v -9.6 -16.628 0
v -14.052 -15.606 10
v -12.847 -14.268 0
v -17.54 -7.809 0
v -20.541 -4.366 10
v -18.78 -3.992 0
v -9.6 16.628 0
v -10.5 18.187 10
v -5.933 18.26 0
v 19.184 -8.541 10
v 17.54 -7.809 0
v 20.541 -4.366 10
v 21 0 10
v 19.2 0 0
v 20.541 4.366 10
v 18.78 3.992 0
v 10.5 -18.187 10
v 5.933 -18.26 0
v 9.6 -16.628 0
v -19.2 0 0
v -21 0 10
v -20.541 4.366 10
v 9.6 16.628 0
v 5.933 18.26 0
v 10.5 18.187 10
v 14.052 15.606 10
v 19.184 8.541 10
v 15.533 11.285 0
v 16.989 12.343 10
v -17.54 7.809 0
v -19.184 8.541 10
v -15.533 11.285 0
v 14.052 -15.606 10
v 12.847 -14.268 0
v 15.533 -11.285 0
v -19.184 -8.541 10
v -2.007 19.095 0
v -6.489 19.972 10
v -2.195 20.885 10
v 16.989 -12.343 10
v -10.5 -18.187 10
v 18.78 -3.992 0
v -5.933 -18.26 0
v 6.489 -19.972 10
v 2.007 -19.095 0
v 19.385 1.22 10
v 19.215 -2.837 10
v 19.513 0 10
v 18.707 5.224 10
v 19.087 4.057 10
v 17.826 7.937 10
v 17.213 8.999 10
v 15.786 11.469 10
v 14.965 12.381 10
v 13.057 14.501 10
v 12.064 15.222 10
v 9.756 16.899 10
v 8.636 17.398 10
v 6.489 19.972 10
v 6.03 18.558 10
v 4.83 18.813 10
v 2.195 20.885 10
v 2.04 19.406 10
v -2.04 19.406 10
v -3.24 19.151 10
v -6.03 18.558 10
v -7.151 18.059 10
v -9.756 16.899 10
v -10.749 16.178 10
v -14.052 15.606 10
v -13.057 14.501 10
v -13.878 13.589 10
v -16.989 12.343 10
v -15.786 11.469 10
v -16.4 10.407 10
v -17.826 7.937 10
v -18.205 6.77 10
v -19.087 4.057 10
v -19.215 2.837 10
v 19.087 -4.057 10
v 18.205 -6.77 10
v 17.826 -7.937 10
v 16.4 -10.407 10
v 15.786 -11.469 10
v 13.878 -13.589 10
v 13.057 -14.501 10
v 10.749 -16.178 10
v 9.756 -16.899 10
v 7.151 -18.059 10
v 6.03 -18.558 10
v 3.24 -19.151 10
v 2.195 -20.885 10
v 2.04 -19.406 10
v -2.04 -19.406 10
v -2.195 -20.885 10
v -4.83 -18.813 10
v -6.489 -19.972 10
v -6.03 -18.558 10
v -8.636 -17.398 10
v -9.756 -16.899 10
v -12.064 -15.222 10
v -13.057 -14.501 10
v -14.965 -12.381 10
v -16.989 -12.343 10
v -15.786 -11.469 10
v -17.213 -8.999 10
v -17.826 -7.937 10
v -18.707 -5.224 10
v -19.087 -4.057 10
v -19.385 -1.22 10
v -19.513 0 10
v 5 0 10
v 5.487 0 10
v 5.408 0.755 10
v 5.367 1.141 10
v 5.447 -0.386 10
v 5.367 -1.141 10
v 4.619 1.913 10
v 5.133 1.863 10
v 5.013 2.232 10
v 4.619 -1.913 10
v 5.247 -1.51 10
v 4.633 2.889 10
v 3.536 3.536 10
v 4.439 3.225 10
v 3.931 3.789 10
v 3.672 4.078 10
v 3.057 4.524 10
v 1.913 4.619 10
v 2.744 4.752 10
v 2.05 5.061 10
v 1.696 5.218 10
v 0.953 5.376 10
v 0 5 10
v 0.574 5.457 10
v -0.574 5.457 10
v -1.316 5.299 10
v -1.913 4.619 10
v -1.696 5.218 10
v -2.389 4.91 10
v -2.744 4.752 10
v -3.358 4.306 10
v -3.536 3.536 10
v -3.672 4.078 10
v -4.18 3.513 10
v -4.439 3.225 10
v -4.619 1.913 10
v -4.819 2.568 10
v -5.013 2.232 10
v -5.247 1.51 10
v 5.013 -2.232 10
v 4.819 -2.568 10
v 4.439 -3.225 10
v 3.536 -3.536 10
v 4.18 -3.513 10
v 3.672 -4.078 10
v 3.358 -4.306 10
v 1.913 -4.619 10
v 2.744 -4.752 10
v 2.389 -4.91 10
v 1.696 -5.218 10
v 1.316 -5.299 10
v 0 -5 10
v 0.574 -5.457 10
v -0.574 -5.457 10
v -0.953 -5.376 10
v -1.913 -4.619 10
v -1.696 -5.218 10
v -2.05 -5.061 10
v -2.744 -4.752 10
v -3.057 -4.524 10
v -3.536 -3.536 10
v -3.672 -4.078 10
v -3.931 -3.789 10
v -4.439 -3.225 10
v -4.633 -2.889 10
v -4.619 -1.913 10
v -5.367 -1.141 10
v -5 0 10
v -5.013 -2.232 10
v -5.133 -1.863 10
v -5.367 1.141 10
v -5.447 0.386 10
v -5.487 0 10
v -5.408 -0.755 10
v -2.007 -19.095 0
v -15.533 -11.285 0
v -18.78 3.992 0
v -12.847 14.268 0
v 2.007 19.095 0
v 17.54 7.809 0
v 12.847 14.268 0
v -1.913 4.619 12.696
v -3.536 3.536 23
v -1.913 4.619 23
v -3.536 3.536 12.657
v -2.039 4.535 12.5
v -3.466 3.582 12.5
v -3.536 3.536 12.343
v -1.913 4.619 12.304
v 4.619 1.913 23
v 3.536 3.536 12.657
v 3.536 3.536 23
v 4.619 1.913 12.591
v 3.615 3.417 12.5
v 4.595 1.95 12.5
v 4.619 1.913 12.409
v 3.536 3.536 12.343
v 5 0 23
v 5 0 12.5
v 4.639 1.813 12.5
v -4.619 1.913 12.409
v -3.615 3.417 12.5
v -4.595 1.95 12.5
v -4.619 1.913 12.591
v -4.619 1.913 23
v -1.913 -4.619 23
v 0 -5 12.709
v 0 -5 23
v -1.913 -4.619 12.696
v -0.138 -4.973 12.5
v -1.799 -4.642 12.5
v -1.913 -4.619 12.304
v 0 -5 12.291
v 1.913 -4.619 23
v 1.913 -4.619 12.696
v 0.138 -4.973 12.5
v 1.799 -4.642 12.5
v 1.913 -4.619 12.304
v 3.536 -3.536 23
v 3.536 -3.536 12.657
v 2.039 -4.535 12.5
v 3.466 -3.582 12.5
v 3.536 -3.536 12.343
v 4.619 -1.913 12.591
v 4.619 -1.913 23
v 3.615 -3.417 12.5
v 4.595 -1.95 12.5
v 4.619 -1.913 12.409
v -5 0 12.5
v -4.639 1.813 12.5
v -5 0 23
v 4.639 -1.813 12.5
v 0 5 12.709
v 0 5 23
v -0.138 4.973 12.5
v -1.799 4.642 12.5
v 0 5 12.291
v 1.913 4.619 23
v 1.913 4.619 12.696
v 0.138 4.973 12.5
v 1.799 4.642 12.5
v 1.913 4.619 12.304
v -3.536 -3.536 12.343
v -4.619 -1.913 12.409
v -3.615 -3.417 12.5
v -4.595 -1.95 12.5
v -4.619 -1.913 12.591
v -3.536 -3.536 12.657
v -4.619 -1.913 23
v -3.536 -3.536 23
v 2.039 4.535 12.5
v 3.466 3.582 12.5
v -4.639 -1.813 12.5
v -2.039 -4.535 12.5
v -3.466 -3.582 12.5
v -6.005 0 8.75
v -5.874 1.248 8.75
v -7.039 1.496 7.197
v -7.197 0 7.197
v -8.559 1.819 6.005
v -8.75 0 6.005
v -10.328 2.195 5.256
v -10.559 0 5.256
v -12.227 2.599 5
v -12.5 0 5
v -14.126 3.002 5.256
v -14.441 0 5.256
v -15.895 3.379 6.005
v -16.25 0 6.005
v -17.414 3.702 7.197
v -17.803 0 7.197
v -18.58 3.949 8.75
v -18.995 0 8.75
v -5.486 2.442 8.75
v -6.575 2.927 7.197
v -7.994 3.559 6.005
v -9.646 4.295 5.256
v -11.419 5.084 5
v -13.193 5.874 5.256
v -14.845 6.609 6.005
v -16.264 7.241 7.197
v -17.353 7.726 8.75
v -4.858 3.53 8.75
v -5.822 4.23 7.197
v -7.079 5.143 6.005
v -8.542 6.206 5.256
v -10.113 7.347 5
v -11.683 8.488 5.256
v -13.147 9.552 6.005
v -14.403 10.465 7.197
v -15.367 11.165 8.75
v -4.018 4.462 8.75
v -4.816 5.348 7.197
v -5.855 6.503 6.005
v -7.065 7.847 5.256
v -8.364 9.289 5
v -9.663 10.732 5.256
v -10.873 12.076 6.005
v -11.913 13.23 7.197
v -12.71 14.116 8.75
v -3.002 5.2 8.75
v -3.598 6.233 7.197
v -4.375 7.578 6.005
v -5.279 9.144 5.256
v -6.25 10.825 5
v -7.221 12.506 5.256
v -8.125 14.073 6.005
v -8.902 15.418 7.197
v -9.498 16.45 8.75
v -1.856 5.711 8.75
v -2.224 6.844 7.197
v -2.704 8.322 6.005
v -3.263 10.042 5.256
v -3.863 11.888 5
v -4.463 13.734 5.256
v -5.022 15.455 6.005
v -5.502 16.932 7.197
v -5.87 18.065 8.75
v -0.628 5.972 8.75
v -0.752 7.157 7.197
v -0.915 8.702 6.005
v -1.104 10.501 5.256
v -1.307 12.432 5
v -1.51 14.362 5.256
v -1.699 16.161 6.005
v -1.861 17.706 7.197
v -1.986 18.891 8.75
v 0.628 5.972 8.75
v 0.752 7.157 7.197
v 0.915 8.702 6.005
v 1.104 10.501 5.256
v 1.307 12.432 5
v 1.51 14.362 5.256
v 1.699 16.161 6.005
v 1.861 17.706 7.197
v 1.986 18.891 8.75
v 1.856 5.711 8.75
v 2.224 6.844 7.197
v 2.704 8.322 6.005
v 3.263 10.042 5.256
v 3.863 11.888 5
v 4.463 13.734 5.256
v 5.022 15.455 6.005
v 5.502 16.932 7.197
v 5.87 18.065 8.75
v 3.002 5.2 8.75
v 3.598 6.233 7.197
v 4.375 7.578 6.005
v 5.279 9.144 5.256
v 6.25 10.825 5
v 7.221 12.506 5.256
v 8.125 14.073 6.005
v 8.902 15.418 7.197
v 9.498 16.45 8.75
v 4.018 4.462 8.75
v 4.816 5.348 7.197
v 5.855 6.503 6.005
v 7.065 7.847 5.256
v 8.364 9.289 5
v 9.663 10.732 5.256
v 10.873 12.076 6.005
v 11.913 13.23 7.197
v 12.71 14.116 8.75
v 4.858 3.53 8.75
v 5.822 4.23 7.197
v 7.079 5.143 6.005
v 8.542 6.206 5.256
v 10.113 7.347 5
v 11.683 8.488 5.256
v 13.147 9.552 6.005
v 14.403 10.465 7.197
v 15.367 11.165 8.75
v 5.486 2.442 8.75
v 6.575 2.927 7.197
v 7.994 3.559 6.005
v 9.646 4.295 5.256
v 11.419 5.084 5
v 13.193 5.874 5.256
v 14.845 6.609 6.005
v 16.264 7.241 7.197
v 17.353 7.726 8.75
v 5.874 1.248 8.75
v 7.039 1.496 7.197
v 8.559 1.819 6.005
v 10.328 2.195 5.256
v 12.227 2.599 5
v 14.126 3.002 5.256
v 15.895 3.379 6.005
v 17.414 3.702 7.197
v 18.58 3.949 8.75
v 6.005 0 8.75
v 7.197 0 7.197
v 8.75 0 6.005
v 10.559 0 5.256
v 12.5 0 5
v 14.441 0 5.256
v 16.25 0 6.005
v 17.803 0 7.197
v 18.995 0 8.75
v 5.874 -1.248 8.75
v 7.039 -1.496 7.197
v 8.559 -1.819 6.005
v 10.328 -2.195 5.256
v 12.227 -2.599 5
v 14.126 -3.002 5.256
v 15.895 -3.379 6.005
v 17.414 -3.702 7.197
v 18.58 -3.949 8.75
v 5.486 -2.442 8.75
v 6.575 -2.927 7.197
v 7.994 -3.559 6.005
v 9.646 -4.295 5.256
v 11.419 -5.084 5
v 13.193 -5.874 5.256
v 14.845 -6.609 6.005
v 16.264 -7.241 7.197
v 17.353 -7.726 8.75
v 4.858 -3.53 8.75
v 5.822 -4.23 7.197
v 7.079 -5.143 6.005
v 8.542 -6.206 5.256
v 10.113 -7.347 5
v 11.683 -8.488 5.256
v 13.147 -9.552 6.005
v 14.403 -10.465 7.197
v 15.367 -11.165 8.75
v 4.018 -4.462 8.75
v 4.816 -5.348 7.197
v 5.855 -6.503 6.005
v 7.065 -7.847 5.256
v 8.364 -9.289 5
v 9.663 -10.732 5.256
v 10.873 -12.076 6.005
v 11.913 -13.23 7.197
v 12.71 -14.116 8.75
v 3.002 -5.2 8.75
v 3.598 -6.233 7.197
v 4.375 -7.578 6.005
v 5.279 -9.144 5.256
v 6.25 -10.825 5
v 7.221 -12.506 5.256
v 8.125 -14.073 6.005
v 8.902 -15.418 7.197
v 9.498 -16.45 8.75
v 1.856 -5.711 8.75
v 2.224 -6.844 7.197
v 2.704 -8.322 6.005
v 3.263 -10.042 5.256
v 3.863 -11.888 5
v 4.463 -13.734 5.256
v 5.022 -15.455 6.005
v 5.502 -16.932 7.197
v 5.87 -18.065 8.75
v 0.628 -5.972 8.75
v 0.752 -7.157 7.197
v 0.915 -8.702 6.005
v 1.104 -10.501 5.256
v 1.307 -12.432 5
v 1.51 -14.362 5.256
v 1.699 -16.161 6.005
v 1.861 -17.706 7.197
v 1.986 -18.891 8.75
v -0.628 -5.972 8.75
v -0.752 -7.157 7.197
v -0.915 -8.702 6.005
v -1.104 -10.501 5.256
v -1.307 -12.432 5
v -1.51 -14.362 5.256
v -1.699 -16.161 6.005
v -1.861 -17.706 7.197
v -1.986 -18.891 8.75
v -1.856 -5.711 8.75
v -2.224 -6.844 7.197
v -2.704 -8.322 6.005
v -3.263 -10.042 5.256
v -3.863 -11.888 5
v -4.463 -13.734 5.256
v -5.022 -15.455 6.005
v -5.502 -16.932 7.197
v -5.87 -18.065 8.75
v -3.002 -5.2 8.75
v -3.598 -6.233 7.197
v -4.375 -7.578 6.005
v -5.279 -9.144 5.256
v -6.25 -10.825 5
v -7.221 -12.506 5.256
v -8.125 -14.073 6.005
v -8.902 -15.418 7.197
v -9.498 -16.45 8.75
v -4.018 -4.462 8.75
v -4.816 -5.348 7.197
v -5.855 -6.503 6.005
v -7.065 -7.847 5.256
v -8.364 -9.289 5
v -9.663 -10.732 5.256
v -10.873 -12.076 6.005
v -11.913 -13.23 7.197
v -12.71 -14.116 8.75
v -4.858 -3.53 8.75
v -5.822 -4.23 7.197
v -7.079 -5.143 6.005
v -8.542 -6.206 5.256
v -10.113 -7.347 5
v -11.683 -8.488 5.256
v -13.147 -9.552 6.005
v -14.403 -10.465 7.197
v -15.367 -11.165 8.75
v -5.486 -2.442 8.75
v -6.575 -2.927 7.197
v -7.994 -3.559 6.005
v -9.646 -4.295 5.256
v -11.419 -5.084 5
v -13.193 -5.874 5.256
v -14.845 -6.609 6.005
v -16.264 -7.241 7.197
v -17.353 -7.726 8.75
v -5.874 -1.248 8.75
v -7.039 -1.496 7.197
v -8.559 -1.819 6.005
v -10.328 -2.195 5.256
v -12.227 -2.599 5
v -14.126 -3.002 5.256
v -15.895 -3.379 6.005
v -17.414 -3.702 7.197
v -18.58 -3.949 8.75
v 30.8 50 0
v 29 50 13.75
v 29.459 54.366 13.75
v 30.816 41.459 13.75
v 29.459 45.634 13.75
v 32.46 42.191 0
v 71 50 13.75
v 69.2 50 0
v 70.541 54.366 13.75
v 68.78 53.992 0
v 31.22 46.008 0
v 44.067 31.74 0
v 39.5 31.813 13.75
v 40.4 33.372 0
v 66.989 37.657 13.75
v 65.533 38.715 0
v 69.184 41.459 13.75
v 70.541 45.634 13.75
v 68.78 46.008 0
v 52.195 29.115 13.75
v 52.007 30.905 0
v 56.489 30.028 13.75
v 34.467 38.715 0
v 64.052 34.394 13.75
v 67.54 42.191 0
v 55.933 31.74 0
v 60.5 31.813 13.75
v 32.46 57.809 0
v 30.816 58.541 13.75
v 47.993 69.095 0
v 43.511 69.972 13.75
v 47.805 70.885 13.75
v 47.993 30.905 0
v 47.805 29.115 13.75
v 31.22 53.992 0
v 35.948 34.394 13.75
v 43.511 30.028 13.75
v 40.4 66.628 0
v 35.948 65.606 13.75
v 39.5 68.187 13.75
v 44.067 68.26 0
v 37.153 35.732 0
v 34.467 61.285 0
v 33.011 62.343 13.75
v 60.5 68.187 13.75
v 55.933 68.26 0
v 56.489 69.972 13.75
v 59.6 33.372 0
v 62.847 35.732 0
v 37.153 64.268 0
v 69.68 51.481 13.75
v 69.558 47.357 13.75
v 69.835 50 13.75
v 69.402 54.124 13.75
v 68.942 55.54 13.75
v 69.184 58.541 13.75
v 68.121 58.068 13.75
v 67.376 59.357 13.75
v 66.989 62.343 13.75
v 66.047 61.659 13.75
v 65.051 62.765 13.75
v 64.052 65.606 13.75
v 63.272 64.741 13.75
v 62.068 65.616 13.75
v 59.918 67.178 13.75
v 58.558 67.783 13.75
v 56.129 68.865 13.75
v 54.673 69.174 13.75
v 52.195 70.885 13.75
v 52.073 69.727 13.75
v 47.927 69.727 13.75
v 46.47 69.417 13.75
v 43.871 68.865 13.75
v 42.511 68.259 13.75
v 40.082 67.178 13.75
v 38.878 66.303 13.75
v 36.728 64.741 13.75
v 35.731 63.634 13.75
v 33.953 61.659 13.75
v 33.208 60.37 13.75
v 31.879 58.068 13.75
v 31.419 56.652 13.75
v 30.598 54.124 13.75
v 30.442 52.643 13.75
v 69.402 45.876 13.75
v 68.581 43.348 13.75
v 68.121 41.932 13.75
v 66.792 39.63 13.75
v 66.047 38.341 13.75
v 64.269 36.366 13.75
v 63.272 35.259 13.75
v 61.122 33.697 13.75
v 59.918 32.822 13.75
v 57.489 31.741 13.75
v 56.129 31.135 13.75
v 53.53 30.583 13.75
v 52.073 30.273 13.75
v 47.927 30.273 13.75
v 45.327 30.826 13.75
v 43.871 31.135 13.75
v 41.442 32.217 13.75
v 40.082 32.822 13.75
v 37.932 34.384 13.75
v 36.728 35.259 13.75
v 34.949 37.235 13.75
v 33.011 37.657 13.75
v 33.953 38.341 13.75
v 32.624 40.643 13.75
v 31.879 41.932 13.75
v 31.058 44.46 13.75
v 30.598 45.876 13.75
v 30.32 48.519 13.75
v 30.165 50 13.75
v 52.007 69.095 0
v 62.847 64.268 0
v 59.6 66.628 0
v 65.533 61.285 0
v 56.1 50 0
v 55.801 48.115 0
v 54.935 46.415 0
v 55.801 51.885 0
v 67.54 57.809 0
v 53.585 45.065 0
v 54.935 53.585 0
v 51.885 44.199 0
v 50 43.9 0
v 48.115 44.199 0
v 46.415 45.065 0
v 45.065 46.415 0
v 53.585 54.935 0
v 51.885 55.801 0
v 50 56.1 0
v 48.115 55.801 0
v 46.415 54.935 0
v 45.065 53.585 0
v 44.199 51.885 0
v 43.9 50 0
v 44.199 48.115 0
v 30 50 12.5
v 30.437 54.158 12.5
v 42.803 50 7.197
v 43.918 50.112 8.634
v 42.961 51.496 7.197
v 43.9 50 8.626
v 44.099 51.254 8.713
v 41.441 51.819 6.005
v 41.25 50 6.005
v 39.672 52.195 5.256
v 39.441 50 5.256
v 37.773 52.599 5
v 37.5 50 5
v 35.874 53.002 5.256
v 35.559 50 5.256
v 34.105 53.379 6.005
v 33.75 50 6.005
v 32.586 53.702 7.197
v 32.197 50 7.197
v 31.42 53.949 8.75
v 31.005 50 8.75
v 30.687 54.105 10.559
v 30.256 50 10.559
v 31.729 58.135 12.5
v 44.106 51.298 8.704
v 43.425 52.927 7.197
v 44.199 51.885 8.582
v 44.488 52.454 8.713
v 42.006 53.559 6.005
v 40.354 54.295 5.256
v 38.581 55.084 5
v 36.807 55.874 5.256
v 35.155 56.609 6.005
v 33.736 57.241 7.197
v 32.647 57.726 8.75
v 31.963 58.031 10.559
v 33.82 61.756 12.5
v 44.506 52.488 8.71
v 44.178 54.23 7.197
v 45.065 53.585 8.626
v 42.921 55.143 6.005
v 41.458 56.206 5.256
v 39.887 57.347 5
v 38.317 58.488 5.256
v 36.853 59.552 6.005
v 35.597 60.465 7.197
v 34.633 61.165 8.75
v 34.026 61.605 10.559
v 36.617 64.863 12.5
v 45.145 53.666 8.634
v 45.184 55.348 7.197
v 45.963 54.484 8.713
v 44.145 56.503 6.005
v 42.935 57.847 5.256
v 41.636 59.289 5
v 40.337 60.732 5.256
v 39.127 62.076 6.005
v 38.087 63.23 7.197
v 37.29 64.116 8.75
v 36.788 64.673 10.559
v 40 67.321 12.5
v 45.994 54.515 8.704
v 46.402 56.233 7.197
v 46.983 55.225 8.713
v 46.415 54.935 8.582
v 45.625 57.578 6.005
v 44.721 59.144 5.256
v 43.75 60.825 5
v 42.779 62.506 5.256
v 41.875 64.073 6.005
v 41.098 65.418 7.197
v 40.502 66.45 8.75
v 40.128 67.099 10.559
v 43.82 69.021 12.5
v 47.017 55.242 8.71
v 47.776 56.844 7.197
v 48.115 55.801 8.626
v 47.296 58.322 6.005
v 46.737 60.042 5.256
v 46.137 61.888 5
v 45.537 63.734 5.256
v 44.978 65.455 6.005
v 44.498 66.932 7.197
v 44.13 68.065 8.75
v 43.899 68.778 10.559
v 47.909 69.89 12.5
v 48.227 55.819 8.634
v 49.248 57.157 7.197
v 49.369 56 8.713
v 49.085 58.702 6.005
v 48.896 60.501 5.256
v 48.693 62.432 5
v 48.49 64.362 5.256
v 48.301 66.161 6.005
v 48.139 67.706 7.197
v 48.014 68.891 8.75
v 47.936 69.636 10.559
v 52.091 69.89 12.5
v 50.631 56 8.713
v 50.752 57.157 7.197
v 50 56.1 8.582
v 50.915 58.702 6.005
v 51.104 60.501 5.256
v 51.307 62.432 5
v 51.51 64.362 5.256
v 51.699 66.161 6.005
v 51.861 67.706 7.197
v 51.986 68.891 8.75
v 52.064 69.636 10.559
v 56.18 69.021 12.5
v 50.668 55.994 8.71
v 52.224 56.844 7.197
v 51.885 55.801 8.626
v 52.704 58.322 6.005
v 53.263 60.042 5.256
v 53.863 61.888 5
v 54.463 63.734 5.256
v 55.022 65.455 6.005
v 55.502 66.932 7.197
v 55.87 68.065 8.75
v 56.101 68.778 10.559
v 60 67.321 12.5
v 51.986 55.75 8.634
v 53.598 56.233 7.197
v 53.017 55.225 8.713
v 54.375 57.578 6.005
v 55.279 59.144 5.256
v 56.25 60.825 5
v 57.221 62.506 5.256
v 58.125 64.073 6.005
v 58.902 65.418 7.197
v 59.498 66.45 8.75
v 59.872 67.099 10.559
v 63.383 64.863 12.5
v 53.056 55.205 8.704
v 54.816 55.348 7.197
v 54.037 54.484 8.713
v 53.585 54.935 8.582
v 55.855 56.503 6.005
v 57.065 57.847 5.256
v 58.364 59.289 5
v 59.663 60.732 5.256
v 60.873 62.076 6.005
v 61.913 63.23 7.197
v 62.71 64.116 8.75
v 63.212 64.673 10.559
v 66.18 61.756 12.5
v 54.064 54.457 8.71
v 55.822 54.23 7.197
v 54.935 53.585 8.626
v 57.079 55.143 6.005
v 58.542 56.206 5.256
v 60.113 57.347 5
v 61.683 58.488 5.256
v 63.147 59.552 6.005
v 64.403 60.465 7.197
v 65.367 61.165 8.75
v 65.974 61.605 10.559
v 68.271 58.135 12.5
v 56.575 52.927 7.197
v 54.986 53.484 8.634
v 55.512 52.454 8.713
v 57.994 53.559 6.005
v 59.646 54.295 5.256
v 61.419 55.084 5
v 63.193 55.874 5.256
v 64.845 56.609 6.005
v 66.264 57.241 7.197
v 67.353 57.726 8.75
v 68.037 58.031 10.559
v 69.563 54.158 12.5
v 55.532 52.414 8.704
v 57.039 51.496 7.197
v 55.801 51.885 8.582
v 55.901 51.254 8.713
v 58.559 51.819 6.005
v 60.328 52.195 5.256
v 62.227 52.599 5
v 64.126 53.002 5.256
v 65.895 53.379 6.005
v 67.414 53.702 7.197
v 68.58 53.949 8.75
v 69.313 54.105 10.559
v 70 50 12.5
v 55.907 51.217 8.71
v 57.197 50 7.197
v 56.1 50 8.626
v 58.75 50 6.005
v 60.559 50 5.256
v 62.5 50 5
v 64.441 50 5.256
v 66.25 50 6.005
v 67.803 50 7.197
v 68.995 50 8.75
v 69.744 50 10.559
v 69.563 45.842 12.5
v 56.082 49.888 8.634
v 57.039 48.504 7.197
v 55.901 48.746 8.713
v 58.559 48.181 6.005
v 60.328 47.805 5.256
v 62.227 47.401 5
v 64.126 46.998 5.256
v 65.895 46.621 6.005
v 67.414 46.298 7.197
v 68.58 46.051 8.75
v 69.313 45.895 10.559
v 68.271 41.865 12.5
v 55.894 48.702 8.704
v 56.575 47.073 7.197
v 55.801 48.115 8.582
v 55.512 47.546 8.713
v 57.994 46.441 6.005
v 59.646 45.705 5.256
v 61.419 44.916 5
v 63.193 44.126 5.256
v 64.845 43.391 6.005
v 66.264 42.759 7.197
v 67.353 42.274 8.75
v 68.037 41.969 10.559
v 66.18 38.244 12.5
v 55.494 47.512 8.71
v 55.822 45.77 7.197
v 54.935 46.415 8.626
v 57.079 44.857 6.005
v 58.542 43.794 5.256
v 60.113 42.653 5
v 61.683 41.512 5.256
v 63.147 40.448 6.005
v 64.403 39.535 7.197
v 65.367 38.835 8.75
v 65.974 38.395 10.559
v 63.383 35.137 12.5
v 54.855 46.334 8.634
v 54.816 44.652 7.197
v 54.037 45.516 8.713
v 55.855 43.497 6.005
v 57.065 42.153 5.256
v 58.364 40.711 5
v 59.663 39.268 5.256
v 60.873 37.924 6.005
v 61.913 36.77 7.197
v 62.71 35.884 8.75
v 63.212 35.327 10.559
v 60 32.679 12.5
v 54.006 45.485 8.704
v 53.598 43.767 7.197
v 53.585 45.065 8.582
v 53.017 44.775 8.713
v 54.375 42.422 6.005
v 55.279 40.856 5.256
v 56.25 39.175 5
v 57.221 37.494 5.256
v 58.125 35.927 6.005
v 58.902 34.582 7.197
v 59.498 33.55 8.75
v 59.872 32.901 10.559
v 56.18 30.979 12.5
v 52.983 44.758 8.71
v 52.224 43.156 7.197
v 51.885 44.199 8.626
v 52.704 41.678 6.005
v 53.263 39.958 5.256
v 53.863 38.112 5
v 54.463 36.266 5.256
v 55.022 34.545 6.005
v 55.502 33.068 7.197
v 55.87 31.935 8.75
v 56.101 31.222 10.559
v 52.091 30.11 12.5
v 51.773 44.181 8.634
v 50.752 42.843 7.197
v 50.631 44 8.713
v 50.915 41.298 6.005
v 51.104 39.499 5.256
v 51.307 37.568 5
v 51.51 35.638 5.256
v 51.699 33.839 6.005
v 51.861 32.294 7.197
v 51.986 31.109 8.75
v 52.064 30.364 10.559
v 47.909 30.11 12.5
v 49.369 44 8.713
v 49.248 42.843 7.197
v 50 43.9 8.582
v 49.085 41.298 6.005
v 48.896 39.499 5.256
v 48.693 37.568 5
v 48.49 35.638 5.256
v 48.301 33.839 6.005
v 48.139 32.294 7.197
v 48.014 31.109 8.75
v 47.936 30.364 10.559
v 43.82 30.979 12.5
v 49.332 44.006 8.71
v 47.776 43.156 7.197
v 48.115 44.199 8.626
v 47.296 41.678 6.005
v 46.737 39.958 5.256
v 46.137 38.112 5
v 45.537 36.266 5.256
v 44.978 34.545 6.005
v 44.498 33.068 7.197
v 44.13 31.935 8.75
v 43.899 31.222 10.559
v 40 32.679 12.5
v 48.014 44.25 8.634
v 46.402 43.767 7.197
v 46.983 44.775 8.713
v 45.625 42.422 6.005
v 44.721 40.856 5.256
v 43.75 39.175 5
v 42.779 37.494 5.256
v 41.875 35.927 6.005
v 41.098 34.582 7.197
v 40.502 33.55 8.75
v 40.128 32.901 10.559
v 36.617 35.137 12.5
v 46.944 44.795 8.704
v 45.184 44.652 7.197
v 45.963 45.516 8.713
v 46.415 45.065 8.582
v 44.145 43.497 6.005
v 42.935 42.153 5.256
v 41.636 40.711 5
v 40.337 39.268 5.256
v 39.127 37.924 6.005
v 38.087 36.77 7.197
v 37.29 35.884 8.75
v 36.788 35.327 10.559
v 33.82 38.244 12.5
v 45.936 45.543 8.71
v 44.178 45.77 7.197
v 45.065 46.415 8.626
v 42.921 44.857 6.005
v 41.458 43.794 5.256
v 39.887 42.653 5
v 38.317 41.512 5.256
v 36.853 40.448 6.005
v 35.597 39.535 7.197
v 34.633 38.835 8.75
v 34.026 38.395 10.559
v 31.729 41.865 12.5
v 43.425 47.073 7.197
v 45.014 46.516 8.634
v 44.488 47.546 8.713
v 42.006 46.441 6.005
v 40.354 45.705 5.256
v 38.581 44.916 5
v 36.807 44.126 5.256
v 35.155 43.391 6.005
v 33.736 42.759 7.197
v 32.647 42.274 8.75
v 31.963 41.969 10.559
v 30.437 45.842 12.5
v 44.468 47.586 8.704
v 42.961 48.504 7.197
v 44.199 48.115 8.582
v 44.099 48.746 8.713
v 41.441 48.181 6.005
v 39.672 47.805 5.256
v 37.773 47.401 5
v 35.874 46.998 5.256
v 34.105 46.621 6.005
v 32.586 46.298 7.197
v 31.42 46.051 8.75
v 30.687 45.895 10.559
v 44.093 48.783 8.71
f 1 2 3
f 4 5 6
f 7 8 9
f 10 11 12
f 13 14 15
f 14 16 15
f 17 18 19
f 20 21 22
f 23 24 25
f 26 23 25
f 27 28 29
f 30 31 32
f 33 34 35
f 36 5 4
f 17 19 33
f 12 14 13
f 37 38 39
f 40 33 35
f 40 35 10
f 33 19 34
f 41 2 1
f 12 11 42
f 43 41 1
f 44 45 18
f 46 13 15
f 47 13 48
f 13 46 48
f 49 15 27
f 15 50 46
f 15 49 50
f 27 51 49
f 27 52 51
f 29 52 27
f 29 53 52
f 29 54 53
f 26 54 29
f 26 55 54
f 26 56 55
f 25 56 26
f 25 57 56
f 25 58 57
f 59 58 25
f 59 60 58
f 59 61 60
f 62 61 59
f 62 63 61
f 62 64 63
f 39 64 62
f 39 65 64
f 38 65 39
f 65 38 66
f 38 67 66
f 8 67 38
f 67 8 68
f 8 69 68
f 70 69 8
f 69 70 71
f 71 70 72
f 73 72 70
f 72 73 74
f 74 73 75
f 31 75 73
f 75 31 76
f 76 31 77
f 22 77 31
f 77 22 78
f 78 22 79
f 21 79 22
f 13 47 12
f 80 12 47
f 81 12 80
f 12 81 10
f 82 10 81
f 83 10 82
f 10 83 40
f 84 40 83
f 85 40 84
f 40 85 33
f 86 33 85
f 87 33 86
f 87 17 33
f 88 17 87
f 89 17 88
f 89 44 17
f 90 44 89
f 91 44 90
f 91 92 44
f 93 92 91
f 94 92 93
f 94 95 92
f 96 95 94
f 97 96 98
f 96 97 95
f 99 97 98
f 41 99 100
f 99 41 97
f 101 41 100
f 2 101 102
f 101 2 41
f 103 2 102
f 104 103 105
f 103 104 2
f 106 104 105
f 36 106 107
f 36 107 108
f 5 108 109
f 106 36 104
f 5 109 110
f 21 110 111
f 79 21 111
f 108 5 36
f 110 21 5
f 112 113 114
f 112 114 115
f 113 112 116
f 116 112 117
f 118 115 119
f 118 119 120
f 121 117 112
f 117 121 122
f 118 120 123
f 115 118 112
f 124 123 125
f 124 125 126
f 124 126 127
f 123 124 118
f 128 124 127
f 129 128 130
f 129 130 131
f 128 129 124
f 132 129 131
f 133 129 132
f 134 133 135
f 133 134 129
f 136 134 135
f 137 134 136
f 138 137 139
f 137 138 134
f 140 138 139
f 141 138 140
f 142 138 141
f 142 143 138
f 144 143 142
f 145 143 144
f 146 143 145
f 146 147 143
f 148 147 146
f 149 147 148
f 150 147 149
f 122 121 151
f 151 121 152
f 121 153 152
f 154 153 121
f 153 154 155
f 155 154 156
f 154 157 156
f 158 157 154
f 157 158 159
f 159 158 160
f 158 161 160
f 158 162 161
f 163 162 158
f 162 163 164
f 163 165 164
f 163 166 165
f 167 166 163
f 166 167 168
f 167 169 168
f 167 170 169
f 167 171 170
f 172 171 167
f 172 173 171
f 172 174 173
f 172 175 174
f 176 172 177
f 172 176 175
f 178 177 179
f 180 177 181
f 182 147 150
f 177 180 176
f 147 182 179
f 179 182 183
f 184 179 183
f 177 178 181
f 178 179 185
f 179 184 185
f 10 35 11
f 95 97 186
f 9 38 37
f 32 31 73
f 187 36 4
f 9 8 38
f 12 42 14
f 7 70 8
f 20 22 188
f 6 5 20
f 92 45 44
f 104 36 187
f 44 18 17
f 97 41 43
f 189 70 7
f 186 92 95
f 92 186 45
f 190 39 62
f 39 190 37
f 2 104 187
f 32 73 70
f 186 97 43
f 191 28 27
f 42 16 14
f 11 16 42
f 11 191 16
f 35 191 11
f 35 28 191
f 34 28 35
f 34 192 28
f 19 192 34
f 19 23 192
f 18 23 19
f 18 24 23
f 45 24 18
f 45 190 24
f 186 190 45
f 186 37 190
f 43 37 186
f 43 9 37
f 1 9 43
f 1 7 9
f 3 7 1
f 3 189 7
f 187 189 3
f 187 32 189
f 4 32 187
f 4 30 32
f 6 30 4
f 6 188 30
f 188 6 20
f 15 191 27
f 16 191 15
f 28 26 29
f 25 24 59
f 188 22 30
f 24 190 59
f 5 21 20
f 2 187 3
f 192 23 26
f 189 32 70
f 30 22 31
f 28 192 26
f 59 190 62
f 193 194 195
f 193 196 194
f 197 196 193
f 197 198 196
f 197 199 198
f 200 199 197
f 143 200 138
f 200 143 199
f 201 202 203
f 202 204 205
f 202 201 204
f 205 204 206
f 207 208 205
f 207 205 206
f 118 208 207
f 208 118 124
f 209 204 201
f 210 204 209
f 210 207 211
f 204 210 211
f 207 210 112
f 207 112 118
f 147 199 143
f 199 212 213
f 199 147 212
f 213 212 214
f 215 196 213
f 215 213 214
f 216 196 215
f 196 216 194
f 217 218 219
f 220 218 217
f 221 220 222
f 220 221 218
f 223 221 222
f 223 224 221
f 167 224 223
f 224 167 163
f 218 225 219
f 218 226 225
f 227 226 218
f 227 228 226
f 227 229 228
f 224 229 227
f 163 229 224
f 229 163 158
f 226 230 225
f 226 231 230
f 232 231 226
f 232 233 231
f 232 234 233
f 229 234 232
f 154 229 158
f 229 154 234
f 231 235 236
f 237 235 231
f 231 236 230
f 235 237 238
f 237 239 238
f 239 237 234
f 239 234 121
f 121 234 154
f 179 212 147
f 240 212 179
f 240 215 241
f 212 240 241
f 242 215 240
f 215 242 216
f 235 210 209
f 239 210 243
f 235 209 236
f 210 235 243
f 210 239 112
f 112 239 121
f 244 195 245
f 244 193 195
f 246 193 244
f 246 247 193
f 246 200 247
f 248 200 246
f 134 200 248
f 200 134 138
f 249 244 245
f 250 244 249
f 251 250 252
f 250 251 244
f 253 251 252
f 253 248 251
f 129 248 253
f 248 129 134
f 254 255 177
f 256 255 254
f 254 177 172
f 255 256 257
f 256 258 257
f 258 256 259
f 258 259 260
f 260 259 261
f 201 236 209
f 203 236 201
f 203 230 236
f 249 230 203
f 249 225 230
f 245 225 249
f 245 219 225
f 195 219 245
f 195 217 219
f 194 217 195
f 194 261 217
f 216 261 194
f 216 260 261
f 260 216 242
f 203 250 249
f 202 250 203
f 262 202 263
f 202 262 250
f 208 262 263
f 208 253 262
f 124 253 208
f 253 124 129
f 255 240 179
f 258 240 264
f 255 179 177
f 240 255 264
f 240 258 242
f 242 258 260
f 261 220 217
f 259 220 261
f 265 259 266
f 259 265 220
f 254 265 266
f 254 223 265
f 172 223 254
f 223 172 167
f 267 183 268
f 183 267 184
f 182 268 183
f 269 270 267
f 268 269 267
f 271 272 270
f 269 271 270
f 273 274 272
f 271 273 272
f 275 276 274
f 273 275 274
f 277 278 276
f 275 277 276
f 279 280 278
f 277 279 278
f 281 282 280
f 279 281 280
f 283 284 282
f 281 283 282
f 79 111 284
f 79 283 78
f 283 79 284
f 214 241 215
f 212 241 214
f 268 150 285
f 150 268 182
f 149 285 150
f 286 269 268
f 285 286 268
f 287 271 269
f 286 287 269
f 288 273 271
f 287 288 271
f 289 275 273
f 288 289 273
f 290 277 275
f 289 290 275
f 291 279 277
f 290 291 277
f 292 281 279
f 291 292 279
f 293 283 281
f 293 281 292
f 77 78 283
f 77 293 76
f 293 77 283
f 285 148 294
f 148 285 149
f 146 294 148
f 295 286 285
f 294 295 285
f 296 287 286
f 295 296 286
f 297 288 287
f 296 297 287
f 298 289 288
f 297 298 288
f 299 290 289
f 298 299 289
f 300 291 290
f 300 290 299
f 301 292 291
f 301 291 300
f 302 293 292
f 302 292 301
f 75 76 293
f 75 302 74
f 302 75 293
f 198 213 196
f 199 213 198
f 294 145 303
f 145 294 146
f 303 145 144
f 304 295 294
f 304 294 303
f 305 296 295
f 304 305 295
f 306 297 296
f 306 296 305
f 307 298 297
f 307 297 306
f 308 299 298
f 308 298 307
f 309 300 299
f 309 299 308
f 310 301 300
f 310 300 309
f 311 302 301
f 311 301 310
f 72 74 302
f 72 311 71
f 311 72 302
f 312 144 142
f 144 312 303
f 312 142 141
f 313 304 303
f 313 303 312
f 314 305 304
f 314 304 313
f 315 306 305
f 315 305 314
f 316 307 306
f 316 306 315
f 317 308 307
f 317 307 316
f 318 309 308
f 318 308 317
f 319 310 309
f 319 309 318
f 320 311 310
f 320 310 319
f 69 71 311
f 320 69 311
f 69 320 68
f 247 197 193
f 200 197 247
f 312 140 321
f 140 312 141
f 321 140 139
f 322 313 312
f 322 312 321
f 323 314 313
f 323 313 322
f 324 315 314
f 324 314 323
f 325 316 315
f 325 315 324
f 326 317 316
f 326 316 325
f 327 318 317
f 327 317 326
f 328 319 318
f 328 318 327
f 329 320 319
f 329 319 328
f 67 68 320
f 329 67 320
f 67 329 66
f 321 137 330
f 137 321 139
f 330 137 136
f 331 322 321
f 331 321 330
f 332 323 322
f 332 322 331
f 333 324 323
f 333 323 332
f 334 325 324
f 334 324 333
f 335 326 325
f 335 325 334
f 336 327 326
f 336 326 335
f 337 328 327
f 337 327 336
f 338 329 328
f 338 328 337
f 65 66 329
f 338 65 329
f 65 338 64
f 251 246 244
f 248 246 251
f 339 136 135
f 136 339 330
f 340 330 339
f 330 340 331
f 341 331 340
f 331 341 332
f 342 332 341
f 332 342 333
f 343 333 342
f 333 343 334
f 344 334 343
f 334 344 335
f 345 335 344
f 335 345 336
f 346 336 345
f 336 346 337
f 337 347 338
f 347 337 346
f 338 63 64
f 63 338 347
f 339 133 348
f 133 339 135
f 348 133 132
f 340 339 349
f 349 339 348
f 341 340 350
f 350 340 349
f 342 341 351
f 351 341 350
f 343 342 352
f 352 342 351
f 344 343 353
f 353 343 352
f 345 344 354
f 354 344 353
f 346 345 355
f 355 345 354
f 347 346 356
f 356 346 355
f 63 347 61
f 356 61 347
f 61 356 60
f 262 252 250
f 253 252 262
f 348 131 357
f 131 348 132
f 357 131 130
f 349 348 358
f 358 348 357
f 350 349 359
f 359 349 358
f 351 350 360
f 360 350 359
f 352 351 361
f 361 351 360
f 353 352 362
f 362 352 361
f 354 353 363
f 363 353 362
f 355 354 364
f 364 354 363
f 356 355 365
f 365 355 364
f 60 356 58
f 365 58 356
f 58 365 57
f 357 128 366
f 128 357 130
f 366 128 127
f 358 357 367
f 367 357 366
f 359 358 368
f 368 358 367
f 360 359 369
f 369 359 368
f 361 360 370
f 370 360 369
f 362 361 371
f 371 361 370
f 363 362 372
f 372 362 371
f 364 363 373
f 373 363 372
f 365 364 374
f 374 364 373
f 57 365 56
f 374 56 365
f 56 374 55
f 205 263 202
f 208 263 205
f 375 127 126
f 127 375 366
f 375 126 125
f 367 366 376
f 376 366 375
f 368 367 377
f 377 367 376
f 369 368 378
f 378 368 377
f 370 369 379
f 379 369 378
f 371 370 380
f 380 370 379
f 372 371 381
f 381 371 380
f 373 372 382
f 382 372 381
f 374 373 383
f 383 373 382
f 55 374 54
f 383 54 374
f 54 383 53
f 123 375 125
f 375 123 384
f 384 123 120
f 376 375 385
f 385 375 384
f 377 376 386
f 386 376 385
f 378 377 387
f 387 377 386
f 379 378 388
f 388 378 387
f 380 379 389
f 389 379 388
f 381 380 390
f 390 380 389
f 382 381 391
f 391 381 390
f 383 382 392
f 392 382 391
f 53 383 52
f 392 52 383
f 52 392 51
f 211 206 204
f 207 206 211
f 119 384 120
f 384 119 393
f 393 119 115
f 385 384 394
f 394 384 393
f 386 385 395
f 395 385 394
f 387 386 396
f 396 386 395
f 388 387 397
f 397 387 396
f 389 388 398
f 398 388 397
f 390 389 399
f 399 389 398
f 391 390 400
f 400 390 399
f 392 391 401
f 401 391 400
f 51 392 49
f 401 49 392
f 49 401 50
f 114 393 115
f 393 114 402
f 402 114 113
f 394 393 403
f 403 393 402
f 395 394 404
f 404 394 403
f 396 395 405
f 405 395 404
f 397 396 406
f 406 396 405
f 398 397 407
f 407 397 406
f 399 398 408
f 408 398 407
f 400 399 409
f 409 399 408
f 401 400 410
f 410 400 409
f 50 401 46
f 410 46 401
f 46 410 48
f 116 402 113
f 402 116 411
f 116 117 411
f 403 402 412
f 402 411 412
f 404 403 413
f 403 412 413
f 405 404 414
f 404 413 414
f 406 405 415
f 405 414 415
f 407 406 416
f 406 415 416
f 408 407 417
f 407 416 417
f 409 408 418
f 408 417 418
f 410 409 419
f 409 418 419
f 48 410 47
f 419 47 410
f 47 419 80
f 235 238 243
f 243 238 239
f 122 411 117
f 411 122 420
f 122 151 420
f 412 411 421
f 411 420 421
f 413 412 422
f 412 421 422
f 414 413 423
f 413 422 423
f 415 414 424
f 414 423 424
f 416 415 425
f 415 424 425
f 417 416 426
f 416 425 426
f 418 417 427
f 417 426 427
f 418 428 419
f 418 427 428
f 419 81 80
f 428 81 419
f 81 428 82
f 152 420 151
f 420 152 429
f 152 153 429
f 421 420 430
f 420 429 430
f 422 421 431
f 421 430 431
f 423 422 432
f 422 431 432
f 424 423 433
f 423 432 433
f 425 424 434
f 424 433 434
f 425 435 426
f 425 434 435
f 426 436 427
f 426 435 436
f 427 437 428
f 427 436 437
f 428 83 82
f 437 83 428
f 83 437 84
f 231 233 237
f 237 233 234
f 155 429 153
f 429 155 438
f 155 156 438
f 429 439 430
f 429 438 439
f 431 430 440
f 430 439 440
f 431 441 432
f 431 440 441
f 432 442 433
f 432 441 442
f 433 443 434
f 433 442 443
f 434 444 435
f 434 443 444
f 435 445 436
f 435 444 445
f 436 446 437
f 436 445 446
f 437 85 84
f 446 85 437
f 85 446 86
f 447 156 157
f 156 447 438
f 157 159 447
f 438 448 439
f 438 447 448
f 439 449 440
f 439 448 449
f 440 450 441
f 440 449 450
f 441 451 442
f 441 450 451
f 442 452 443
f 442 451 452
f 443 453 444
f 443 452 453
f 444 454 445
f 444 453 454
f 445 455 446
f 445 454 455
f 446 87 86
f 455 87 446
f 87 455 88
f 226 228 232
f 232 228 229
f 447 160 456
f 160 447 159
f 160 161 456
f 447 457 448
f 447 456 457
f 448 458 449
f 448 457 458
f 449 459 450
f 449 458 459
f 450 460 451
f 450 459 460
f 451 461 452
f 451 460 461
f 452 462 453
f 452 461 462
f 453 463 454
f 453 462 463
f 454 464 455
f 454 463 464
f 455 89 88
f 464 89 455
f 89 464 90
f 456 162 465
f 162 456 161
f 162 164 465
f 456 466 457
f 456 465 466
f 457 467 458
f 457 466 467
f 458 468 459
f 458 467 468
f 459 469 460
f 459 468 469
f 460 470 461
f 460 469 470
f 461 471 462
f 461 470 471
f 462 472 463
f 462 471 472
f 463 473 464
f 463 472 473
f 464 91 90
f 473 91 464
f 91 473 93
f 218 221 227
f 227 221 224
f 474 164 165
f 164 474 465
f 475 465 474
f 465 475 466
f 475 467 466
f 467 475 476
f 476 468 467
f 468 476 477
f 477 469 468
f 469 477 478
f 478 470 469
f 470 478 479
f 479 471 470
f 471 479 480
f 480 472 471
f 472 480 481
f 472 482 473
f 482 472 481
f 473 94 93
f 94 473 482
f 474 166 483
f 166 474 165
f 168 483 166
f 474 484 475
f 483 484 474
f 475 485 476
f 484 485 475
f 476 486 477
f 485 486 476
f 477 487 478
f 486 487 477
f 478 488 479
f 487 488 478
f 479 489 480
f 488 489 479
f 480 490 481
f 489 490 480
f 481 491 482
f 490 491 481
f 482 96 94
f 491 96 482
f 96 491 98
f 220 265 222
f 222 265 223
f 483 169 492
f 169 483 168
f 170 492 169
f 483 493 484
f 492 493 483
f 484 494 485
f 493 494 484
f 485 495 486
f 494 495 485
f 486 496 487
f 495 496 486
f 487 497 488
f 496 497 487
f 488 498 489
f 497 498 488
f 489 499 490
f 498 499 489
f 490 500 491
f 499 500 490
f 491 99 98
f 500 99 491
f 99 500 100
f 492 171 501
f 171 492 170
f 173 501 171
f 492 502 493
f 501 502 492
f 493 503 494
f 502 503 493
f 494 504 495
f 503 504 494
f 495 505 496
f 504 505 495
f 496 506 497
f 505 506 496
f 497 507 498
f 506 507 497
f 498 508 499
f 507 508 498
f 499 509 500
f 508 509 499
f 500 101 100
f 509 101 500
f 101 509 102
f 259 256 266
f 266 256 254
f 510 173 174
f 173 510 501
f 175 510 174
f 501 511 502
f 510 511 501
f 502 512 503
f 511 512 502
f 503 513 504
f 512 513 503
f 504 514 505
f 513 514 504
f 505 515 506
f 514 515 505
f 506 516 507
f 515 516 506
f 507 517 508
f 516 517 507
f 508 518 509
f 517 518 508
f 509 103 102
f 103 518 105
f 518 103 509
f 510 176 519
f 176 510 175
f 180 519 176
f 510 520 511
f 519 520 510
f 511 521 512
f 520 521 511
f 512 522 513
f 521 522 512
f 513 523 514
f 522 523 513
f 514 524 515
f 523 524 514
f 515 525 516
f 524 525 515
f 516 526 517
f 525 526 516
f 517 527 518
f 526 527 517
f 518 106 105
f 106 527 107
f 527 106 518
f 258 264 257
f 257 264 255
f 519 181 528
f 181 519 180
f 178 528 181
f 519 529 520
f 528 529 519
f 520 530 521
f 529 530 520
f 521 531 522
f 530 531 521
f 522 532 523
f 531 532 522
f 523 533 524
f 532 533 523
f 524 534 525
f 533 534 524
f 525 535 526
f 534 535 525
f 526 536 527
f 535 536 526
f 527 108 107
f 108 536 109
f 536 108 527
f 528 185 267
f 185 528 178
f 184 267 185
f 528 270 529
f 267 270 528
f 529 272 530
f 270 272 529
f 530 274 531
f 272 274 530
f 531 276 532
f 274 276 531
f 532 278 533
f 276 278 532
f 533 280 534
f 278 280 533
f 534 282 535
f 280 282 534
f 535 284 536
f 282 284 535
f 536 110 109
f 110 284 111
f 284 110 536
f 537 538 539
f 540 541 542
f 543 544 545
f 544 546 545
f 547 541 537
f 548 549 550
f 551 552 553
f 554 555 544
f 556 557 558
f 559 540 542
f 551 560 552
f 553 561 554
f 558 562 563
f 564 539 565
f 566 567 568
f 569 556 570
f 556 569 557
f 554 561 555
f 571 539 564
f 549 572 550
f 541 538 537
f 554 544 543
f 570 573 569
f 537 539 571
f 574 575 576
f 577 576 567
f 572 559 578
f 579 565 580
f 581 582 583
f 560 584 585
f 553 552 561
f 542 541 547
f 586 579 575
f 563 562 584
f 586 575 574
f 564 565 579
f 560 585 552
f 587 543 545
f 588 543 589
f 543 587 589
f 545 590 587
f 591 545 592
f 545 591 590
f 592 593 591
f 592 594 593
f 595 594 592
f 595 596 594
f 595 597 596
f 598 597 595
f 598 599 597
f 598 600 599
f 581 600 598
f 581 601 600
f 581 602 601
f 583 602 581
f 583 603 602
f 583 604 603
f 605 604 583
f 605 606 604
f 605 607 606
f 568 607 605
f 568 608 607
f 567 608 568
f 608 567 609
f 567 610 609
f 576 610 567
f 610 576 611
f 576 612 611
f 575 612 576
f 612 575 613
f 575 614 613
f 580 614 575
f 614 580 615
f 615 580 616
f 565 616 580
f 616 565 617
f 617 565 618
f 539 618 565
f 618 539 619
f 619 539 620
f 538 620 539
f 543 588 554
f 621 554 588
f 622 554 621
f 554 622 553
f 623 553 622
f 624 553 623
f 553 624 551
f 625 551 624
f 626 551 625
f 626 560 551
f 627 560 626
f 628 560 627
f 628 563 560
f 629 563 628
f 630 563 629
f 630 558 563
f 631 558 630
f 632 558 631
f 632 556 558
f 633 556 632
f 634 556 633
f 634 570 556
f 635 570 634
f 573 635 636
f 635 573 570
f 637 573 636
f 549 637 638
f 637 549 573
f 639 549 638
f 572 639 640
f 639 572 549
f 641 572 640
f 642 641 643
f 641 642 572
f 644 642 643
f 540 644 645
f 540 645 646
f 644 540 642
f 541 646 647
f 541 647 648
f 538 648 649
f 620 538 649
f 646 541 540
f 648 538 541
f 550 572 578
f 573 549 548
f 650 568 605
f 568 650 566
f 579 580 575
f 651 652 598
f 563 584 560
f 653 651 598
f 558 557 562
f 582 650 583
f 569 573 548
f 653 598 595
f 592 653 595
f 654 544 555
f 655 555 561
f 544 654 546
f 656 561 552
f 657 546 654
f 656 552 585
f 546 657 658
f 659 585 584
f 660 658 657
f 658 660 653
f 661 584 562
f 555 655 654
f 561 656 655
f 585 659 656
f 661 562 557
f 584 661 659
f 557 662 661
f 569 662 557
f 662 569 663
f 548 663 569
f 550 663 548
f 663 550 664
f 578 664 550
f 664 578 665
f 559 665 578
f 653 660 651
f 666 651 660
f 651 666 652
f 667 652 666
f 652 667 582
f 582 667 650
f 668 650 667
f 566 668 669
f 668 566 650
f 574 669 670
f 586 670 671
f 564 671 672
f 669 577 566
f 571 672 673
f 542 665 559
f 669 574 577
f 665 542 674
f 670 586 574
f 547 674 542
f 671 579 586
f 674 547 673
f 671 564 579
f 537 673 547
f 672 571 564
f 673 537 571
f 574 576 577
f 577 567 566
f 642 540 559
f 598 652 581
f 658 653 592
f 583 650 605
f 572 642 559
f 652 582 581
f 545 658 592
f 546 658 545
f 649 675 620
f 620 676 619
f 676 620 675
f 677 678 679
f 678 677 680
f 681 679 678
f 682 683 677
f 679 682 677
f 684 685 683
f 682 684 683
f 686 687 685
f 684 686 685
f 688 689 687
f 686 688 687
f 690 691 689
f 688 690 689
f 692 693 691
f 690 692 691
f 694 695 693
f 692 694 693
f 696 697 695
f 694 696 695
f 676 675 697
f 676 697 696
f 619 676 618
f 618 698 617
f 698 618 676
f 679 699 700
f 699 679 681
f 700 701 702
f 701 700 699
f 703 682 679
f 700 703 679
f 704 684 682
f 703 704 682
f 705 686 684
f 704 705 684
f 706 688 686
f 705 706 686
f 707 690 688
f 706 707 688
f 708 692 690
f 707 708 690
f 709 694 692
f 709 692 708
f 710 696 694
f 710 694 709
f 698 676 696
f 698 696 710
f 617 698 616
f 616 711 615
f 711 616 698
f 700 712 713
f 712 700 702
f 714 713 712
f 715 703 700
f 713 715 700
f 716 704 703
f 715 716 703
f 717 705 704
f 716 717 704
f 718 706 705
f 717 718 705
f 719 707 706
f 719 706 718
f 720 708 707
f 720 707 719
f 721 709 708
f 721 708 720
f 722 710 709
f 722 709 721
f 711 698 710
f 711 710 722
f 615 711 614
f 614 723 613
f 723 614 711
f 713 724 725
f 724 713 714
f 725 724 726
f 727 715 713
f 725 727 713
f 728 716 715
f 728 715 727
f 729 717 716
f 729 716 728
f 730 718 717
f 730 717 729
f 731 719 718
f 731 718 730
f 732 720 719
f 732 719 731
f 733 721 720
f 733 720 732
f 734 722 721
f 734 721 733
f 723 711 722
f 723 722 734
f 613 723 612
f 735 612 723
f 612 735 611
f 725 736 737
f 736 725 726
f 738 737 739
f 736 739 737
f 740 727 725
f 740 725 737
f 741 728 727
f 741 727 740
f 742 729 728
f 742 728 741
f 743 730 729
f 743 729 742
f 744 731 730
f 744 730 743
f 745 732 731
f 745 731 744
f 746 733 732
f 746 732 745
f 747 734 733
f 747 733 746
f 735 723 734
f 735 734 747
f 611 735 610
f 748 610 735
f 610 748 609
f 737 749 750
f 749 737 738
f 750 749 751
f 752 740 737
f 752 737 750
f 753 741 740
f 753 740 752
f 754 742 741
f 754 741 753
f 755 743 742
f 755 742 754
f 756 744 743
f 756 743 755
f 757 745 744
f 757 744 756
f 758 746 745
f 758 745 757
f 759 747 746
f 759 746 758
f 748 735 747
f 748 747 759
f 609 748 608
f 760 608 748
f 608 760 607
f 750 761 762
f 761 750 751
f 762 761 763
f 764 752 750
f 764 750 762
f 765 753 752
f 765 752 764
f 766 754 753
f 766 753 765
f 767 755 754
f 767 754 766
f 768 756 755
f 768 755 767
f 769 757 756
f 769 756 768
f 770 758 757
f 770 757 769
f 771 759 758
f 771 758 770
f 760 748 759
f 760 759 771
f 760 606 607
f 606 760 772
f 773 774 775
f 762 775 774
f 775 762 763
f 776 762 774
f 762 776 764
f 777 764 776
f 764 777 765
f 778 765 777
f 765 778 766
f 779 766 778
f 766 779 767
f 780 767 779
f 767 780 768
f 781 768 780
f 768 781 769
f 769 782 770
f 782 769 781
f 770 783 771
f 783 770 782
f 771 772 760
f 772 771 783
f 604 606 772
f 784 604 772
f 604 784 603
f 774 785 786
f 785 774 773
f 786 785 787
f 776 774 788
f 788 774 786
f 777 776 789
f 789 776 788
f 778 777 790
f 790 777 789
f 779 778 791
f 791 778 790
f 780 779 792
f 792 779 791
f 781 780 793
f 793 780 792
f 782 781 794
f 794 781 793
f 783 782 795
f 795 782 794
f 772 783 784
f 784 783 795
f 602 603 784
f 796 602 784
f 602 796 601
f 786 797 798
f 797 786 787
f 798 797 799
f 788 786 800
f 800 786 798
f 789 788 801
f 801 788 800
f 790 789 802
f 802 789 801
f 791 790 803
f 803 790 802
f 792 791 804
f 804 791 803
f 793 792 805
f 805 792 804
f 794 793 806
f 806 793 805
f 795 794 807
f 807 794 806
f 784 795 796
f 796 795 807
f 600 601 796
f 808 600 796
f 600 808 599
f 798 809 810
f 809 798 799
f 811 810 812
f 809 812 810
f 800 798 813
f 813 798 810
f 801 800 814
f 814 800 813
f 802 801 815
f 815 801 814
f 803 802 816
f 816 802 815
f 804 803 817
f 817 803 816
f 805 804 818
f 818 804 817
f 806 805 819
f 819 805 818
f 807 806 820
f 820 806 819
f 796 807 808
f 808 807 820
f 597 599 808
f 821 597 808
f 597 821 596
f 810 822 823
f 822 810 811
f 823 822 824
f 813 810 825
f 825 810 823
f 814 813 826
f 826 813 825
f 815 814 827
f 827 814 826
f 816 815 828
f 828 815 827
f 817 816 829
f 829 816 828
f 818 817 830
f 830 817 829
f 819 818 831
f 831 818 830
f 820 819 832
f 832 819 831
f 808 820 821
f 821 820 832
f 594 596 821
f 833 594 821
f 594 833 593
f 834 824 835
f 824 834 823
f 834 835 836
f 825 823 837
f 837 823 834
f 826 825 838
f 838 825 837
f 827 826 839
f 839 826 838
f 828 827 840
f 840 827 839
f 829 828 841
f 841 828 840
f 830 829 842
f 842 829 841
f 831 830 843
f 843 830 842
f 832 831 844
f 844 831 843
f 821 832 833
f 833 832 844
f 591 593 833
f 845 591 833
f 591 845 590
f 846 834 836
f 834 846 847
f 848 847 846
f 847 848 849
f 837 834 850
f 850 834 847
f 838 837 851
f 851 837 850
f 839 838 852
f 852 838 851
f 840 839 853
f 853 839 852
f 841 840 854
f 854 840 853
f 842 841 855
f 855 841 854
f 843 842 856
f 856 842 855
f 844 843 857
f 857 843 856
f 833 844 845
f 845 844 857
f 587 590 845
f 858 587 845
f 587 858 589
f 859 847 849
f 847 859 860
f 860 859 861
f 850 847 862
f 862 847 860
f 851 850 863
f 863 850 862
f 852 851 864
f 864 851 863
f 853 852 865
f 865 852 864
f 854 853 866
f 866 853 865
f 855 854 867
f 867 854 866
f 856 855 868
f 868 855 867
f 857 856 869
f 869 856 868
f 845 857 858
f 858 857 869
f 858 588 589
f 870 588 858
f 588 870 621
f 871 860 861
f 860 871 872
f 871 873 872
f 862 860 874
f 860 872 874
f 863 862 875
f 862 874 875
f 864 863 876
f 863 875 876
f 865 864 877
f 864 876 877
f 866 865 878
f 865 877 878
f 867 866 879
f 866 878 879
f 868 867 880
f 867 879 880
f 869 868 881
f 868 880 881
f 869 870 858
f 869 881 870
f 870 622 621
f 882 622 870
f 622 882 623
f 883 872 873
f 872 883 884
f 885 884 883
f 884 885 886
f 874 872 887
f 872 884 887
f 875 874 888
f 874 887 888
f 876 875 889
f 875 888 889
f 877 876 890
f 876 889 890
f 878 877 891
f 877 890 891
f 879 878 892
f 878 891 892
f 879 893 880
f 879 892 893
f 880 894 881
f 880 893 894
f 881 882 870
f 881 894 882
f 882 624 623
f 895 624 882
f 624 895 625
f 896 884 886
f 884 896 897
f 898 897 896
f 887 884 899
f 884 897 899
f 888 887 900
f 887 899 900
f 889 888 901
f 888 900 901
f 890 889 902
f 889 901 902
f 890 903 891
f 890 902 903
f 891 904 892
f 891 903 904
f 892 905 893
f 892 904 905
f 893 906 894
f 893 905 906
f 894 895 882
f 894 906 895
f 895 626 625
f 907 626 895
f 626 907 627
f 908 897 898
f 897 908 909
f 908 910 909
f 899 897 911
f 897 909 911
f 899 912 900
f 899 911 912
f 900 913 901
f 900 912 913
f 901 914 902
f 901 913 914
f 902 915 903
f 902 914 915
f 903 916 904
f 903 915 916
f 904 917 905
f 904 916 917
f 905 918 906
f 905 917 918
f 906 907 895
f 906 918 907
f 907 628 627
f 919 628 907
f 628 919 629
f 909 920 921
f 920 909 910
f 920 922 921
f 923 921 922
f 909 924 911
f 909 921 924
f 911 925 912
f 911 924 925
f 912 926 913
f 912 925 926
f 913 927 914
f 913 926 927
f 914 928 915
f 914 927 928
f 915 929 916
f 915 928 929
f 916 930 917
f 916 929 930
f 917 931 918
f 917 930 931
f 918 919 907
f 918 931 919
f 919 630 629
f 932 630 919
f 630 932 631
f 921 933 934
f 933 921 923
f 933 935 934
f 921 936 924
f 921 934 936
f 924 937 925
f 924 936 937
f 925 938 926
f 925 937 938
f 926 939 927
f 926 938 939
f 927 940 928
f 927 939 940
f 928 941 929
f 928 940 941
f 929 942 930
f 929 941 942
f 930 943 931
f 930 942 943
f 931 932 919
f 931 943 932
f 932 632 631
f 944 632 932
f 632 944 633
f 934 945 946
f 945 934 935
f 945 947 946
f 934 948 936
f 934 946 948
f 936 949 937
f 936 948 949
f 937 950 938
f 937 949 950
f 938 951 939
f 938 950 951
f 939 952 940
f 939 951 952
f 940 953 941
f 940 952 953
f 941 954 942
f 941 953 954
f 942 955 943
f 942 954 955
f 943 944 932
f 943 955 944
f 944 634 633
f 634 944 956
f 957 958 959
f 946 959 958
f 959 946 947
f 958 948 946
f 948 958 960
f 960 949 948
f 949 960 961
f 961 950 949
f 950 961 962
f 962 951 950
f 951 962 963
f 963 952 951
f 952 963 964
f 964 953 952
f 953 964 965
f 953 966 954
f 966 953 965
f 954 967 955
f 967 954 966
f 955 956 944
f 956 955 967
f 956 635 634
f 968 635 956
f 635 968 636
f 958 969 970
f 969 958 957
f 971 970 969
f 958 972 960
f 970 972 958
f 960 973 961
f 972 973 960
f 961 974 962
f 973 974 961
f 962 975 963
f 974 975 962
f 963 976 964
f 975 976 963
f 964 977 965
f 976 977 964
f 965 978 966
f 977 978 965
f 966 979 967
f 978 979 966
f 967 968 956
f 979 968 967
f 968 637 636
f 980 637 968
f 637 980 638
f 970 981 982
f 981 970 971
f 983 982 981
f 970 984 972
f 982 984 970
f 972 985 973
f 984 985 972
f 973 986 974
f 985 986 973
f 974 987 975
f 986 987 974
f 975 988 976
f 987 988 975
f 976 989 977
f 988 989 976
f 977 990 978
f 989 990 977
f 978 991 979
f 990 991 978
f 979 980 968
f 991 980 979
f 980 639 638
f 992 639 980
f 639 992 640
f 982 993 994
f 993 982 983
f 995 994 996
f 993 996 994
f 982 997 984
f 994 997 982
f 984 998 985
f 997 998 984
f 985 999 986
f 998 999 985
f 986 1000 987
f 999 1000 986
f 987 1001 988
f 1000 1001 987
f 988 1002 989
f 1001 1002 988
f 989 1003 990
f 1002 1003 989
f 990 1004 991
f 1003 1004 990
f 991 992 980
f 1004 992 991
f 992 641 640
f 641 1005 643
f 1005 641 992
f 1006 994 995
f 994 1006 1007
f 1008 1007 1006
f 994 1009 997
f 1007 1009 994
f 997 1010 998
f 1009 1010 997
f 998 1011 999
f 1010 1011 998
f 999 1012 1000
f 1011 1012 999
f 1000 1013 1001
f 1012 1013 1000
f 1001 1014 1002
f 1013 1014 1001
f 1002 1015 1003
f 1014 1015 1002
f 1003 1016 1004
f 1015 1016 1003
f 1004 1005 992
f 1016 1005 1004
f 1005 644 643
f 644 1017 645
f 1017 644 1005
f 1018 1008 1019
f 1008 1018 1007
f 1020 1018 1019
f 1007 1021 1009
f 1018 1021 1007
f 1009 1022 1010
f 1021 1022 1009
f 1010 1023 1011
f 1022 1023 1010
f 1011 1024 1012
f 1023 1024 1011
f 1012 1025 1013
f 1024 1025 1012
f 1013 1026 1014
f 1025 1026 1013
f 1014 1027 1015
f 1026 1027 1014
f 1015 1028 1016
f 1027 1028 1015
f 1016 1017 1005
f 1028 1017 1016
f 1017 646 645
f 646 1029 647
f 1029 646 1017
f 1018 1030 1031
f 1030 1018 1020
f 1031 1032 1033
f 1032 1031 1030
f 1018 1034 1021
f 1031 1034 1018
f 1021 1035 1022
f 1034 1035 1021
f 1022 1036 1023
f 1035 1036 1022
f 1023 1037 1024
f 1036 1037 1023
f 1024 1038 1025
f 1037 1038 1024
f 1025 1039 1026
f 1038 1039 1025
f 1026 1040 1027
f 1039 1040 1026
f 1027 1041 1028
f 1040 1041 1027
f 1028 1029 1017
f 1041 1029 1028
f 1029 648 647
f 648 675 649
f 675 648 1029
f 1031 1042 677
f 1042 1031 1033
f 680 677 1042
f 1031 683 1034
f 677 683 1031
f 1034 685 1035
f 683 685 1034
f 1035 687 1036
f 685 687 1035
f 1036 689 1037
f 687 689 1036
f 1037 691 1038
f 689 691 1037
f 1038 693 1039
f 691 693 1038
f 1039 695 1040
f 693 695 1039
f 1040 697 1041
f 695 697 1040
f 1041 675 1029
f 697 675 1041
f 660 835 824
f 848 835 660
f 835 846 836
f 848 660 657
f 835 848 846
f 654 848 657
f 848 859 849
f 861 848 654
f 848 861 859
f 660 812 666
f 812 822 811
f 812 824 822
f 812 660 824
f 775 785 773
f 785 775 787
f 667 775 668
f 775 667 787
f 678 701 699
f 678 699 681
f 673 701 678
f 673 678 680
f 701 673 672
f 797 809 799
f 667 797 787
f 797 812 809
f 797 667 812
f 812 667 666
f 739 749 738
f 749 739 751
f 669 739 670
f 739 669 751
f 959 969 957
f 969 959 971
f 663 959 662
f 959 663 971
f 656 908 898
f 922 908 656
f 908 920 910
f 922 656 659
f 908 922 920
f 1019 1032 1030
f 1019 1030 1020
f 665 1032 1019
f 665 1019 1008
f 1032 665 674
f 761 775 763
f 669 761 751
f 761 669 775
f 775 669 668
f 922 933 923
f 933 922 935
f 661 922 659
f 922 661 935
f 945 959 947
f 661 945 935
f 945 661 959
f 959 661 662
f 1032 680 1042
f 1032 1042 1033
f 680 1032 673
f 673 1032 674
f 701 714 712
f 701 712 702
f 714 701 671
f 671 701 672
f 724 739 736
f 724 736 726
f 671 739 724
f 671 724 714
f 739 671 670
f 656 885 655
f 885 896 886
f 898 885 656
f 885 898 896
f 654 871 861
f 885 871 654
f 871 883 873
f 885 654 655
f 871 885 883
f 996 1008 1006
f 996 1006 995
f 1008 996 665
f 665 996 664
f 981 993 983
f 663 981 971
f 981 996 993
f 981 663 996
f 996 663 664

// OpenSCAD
//
//  Copyright (C) 18-04-2012 Jasper den Ouden. (ojasper.nl)
//
//  This is free software: you can redistribute it and/or modify
//  it under the terms of the GNU General Public License as published
//  by the Free Software Foundation, either version 3 of the License, or
//  (at your option) any later version.
//

//Variables throughout:
mr= 15/2; //Radius of marbles.
ri = 5; //Radius of pole.
et = 1;  //Thickness of edge.
uz = 5; //Height of bottom plate.
ur = 0; //Radius at bottom
tz= 3*et; //Height thing.
s=1.1;

module marble_torus(mR,mr)
{   rotate_extrude() translate([mR,0]) circle(mr); }

//'Rod radius'
module marble_male(ri,mr, uz,ur,tz, et)
{
    ro = et+ri+2*mr;
    difference()
    {   union()
        {   cylinder(r1=max(ur,1.2*(ro-uz)), r2=ro, h=uz+2*mr/3);
            cylinder(r=ri, h=uz + tz + 2*mr);
        }
        translate([0,0,uz+mr]) marble_torus(ri+mr,mr);
    }
    
}

module marble_female(ri, mr,uz,ur,et)
{
    ro = ri+2*mr+et;
    difference()
    {   cylinder(r1=max(ur,1.2*(ro-uz)), r2=ro, h= uz+7*mr/6);
        translate([0,0,uz+mr]) marble_torus(ri+mr,mr);
        translate([0,0,-uz]) cylinder(r=ri+s,h=3*(uz+mr));
        translate([0,0,uz+2*mr/3]) cylinder(r=ri+mr,h=3*(uz+mr));
    }
}

//Just examples! For standalones use marblethrust_component.
marble_male(ri, mr,uz,ur,tz,et);
translate([50,50]) marble_female(ri, mr,uz,ur,et);
